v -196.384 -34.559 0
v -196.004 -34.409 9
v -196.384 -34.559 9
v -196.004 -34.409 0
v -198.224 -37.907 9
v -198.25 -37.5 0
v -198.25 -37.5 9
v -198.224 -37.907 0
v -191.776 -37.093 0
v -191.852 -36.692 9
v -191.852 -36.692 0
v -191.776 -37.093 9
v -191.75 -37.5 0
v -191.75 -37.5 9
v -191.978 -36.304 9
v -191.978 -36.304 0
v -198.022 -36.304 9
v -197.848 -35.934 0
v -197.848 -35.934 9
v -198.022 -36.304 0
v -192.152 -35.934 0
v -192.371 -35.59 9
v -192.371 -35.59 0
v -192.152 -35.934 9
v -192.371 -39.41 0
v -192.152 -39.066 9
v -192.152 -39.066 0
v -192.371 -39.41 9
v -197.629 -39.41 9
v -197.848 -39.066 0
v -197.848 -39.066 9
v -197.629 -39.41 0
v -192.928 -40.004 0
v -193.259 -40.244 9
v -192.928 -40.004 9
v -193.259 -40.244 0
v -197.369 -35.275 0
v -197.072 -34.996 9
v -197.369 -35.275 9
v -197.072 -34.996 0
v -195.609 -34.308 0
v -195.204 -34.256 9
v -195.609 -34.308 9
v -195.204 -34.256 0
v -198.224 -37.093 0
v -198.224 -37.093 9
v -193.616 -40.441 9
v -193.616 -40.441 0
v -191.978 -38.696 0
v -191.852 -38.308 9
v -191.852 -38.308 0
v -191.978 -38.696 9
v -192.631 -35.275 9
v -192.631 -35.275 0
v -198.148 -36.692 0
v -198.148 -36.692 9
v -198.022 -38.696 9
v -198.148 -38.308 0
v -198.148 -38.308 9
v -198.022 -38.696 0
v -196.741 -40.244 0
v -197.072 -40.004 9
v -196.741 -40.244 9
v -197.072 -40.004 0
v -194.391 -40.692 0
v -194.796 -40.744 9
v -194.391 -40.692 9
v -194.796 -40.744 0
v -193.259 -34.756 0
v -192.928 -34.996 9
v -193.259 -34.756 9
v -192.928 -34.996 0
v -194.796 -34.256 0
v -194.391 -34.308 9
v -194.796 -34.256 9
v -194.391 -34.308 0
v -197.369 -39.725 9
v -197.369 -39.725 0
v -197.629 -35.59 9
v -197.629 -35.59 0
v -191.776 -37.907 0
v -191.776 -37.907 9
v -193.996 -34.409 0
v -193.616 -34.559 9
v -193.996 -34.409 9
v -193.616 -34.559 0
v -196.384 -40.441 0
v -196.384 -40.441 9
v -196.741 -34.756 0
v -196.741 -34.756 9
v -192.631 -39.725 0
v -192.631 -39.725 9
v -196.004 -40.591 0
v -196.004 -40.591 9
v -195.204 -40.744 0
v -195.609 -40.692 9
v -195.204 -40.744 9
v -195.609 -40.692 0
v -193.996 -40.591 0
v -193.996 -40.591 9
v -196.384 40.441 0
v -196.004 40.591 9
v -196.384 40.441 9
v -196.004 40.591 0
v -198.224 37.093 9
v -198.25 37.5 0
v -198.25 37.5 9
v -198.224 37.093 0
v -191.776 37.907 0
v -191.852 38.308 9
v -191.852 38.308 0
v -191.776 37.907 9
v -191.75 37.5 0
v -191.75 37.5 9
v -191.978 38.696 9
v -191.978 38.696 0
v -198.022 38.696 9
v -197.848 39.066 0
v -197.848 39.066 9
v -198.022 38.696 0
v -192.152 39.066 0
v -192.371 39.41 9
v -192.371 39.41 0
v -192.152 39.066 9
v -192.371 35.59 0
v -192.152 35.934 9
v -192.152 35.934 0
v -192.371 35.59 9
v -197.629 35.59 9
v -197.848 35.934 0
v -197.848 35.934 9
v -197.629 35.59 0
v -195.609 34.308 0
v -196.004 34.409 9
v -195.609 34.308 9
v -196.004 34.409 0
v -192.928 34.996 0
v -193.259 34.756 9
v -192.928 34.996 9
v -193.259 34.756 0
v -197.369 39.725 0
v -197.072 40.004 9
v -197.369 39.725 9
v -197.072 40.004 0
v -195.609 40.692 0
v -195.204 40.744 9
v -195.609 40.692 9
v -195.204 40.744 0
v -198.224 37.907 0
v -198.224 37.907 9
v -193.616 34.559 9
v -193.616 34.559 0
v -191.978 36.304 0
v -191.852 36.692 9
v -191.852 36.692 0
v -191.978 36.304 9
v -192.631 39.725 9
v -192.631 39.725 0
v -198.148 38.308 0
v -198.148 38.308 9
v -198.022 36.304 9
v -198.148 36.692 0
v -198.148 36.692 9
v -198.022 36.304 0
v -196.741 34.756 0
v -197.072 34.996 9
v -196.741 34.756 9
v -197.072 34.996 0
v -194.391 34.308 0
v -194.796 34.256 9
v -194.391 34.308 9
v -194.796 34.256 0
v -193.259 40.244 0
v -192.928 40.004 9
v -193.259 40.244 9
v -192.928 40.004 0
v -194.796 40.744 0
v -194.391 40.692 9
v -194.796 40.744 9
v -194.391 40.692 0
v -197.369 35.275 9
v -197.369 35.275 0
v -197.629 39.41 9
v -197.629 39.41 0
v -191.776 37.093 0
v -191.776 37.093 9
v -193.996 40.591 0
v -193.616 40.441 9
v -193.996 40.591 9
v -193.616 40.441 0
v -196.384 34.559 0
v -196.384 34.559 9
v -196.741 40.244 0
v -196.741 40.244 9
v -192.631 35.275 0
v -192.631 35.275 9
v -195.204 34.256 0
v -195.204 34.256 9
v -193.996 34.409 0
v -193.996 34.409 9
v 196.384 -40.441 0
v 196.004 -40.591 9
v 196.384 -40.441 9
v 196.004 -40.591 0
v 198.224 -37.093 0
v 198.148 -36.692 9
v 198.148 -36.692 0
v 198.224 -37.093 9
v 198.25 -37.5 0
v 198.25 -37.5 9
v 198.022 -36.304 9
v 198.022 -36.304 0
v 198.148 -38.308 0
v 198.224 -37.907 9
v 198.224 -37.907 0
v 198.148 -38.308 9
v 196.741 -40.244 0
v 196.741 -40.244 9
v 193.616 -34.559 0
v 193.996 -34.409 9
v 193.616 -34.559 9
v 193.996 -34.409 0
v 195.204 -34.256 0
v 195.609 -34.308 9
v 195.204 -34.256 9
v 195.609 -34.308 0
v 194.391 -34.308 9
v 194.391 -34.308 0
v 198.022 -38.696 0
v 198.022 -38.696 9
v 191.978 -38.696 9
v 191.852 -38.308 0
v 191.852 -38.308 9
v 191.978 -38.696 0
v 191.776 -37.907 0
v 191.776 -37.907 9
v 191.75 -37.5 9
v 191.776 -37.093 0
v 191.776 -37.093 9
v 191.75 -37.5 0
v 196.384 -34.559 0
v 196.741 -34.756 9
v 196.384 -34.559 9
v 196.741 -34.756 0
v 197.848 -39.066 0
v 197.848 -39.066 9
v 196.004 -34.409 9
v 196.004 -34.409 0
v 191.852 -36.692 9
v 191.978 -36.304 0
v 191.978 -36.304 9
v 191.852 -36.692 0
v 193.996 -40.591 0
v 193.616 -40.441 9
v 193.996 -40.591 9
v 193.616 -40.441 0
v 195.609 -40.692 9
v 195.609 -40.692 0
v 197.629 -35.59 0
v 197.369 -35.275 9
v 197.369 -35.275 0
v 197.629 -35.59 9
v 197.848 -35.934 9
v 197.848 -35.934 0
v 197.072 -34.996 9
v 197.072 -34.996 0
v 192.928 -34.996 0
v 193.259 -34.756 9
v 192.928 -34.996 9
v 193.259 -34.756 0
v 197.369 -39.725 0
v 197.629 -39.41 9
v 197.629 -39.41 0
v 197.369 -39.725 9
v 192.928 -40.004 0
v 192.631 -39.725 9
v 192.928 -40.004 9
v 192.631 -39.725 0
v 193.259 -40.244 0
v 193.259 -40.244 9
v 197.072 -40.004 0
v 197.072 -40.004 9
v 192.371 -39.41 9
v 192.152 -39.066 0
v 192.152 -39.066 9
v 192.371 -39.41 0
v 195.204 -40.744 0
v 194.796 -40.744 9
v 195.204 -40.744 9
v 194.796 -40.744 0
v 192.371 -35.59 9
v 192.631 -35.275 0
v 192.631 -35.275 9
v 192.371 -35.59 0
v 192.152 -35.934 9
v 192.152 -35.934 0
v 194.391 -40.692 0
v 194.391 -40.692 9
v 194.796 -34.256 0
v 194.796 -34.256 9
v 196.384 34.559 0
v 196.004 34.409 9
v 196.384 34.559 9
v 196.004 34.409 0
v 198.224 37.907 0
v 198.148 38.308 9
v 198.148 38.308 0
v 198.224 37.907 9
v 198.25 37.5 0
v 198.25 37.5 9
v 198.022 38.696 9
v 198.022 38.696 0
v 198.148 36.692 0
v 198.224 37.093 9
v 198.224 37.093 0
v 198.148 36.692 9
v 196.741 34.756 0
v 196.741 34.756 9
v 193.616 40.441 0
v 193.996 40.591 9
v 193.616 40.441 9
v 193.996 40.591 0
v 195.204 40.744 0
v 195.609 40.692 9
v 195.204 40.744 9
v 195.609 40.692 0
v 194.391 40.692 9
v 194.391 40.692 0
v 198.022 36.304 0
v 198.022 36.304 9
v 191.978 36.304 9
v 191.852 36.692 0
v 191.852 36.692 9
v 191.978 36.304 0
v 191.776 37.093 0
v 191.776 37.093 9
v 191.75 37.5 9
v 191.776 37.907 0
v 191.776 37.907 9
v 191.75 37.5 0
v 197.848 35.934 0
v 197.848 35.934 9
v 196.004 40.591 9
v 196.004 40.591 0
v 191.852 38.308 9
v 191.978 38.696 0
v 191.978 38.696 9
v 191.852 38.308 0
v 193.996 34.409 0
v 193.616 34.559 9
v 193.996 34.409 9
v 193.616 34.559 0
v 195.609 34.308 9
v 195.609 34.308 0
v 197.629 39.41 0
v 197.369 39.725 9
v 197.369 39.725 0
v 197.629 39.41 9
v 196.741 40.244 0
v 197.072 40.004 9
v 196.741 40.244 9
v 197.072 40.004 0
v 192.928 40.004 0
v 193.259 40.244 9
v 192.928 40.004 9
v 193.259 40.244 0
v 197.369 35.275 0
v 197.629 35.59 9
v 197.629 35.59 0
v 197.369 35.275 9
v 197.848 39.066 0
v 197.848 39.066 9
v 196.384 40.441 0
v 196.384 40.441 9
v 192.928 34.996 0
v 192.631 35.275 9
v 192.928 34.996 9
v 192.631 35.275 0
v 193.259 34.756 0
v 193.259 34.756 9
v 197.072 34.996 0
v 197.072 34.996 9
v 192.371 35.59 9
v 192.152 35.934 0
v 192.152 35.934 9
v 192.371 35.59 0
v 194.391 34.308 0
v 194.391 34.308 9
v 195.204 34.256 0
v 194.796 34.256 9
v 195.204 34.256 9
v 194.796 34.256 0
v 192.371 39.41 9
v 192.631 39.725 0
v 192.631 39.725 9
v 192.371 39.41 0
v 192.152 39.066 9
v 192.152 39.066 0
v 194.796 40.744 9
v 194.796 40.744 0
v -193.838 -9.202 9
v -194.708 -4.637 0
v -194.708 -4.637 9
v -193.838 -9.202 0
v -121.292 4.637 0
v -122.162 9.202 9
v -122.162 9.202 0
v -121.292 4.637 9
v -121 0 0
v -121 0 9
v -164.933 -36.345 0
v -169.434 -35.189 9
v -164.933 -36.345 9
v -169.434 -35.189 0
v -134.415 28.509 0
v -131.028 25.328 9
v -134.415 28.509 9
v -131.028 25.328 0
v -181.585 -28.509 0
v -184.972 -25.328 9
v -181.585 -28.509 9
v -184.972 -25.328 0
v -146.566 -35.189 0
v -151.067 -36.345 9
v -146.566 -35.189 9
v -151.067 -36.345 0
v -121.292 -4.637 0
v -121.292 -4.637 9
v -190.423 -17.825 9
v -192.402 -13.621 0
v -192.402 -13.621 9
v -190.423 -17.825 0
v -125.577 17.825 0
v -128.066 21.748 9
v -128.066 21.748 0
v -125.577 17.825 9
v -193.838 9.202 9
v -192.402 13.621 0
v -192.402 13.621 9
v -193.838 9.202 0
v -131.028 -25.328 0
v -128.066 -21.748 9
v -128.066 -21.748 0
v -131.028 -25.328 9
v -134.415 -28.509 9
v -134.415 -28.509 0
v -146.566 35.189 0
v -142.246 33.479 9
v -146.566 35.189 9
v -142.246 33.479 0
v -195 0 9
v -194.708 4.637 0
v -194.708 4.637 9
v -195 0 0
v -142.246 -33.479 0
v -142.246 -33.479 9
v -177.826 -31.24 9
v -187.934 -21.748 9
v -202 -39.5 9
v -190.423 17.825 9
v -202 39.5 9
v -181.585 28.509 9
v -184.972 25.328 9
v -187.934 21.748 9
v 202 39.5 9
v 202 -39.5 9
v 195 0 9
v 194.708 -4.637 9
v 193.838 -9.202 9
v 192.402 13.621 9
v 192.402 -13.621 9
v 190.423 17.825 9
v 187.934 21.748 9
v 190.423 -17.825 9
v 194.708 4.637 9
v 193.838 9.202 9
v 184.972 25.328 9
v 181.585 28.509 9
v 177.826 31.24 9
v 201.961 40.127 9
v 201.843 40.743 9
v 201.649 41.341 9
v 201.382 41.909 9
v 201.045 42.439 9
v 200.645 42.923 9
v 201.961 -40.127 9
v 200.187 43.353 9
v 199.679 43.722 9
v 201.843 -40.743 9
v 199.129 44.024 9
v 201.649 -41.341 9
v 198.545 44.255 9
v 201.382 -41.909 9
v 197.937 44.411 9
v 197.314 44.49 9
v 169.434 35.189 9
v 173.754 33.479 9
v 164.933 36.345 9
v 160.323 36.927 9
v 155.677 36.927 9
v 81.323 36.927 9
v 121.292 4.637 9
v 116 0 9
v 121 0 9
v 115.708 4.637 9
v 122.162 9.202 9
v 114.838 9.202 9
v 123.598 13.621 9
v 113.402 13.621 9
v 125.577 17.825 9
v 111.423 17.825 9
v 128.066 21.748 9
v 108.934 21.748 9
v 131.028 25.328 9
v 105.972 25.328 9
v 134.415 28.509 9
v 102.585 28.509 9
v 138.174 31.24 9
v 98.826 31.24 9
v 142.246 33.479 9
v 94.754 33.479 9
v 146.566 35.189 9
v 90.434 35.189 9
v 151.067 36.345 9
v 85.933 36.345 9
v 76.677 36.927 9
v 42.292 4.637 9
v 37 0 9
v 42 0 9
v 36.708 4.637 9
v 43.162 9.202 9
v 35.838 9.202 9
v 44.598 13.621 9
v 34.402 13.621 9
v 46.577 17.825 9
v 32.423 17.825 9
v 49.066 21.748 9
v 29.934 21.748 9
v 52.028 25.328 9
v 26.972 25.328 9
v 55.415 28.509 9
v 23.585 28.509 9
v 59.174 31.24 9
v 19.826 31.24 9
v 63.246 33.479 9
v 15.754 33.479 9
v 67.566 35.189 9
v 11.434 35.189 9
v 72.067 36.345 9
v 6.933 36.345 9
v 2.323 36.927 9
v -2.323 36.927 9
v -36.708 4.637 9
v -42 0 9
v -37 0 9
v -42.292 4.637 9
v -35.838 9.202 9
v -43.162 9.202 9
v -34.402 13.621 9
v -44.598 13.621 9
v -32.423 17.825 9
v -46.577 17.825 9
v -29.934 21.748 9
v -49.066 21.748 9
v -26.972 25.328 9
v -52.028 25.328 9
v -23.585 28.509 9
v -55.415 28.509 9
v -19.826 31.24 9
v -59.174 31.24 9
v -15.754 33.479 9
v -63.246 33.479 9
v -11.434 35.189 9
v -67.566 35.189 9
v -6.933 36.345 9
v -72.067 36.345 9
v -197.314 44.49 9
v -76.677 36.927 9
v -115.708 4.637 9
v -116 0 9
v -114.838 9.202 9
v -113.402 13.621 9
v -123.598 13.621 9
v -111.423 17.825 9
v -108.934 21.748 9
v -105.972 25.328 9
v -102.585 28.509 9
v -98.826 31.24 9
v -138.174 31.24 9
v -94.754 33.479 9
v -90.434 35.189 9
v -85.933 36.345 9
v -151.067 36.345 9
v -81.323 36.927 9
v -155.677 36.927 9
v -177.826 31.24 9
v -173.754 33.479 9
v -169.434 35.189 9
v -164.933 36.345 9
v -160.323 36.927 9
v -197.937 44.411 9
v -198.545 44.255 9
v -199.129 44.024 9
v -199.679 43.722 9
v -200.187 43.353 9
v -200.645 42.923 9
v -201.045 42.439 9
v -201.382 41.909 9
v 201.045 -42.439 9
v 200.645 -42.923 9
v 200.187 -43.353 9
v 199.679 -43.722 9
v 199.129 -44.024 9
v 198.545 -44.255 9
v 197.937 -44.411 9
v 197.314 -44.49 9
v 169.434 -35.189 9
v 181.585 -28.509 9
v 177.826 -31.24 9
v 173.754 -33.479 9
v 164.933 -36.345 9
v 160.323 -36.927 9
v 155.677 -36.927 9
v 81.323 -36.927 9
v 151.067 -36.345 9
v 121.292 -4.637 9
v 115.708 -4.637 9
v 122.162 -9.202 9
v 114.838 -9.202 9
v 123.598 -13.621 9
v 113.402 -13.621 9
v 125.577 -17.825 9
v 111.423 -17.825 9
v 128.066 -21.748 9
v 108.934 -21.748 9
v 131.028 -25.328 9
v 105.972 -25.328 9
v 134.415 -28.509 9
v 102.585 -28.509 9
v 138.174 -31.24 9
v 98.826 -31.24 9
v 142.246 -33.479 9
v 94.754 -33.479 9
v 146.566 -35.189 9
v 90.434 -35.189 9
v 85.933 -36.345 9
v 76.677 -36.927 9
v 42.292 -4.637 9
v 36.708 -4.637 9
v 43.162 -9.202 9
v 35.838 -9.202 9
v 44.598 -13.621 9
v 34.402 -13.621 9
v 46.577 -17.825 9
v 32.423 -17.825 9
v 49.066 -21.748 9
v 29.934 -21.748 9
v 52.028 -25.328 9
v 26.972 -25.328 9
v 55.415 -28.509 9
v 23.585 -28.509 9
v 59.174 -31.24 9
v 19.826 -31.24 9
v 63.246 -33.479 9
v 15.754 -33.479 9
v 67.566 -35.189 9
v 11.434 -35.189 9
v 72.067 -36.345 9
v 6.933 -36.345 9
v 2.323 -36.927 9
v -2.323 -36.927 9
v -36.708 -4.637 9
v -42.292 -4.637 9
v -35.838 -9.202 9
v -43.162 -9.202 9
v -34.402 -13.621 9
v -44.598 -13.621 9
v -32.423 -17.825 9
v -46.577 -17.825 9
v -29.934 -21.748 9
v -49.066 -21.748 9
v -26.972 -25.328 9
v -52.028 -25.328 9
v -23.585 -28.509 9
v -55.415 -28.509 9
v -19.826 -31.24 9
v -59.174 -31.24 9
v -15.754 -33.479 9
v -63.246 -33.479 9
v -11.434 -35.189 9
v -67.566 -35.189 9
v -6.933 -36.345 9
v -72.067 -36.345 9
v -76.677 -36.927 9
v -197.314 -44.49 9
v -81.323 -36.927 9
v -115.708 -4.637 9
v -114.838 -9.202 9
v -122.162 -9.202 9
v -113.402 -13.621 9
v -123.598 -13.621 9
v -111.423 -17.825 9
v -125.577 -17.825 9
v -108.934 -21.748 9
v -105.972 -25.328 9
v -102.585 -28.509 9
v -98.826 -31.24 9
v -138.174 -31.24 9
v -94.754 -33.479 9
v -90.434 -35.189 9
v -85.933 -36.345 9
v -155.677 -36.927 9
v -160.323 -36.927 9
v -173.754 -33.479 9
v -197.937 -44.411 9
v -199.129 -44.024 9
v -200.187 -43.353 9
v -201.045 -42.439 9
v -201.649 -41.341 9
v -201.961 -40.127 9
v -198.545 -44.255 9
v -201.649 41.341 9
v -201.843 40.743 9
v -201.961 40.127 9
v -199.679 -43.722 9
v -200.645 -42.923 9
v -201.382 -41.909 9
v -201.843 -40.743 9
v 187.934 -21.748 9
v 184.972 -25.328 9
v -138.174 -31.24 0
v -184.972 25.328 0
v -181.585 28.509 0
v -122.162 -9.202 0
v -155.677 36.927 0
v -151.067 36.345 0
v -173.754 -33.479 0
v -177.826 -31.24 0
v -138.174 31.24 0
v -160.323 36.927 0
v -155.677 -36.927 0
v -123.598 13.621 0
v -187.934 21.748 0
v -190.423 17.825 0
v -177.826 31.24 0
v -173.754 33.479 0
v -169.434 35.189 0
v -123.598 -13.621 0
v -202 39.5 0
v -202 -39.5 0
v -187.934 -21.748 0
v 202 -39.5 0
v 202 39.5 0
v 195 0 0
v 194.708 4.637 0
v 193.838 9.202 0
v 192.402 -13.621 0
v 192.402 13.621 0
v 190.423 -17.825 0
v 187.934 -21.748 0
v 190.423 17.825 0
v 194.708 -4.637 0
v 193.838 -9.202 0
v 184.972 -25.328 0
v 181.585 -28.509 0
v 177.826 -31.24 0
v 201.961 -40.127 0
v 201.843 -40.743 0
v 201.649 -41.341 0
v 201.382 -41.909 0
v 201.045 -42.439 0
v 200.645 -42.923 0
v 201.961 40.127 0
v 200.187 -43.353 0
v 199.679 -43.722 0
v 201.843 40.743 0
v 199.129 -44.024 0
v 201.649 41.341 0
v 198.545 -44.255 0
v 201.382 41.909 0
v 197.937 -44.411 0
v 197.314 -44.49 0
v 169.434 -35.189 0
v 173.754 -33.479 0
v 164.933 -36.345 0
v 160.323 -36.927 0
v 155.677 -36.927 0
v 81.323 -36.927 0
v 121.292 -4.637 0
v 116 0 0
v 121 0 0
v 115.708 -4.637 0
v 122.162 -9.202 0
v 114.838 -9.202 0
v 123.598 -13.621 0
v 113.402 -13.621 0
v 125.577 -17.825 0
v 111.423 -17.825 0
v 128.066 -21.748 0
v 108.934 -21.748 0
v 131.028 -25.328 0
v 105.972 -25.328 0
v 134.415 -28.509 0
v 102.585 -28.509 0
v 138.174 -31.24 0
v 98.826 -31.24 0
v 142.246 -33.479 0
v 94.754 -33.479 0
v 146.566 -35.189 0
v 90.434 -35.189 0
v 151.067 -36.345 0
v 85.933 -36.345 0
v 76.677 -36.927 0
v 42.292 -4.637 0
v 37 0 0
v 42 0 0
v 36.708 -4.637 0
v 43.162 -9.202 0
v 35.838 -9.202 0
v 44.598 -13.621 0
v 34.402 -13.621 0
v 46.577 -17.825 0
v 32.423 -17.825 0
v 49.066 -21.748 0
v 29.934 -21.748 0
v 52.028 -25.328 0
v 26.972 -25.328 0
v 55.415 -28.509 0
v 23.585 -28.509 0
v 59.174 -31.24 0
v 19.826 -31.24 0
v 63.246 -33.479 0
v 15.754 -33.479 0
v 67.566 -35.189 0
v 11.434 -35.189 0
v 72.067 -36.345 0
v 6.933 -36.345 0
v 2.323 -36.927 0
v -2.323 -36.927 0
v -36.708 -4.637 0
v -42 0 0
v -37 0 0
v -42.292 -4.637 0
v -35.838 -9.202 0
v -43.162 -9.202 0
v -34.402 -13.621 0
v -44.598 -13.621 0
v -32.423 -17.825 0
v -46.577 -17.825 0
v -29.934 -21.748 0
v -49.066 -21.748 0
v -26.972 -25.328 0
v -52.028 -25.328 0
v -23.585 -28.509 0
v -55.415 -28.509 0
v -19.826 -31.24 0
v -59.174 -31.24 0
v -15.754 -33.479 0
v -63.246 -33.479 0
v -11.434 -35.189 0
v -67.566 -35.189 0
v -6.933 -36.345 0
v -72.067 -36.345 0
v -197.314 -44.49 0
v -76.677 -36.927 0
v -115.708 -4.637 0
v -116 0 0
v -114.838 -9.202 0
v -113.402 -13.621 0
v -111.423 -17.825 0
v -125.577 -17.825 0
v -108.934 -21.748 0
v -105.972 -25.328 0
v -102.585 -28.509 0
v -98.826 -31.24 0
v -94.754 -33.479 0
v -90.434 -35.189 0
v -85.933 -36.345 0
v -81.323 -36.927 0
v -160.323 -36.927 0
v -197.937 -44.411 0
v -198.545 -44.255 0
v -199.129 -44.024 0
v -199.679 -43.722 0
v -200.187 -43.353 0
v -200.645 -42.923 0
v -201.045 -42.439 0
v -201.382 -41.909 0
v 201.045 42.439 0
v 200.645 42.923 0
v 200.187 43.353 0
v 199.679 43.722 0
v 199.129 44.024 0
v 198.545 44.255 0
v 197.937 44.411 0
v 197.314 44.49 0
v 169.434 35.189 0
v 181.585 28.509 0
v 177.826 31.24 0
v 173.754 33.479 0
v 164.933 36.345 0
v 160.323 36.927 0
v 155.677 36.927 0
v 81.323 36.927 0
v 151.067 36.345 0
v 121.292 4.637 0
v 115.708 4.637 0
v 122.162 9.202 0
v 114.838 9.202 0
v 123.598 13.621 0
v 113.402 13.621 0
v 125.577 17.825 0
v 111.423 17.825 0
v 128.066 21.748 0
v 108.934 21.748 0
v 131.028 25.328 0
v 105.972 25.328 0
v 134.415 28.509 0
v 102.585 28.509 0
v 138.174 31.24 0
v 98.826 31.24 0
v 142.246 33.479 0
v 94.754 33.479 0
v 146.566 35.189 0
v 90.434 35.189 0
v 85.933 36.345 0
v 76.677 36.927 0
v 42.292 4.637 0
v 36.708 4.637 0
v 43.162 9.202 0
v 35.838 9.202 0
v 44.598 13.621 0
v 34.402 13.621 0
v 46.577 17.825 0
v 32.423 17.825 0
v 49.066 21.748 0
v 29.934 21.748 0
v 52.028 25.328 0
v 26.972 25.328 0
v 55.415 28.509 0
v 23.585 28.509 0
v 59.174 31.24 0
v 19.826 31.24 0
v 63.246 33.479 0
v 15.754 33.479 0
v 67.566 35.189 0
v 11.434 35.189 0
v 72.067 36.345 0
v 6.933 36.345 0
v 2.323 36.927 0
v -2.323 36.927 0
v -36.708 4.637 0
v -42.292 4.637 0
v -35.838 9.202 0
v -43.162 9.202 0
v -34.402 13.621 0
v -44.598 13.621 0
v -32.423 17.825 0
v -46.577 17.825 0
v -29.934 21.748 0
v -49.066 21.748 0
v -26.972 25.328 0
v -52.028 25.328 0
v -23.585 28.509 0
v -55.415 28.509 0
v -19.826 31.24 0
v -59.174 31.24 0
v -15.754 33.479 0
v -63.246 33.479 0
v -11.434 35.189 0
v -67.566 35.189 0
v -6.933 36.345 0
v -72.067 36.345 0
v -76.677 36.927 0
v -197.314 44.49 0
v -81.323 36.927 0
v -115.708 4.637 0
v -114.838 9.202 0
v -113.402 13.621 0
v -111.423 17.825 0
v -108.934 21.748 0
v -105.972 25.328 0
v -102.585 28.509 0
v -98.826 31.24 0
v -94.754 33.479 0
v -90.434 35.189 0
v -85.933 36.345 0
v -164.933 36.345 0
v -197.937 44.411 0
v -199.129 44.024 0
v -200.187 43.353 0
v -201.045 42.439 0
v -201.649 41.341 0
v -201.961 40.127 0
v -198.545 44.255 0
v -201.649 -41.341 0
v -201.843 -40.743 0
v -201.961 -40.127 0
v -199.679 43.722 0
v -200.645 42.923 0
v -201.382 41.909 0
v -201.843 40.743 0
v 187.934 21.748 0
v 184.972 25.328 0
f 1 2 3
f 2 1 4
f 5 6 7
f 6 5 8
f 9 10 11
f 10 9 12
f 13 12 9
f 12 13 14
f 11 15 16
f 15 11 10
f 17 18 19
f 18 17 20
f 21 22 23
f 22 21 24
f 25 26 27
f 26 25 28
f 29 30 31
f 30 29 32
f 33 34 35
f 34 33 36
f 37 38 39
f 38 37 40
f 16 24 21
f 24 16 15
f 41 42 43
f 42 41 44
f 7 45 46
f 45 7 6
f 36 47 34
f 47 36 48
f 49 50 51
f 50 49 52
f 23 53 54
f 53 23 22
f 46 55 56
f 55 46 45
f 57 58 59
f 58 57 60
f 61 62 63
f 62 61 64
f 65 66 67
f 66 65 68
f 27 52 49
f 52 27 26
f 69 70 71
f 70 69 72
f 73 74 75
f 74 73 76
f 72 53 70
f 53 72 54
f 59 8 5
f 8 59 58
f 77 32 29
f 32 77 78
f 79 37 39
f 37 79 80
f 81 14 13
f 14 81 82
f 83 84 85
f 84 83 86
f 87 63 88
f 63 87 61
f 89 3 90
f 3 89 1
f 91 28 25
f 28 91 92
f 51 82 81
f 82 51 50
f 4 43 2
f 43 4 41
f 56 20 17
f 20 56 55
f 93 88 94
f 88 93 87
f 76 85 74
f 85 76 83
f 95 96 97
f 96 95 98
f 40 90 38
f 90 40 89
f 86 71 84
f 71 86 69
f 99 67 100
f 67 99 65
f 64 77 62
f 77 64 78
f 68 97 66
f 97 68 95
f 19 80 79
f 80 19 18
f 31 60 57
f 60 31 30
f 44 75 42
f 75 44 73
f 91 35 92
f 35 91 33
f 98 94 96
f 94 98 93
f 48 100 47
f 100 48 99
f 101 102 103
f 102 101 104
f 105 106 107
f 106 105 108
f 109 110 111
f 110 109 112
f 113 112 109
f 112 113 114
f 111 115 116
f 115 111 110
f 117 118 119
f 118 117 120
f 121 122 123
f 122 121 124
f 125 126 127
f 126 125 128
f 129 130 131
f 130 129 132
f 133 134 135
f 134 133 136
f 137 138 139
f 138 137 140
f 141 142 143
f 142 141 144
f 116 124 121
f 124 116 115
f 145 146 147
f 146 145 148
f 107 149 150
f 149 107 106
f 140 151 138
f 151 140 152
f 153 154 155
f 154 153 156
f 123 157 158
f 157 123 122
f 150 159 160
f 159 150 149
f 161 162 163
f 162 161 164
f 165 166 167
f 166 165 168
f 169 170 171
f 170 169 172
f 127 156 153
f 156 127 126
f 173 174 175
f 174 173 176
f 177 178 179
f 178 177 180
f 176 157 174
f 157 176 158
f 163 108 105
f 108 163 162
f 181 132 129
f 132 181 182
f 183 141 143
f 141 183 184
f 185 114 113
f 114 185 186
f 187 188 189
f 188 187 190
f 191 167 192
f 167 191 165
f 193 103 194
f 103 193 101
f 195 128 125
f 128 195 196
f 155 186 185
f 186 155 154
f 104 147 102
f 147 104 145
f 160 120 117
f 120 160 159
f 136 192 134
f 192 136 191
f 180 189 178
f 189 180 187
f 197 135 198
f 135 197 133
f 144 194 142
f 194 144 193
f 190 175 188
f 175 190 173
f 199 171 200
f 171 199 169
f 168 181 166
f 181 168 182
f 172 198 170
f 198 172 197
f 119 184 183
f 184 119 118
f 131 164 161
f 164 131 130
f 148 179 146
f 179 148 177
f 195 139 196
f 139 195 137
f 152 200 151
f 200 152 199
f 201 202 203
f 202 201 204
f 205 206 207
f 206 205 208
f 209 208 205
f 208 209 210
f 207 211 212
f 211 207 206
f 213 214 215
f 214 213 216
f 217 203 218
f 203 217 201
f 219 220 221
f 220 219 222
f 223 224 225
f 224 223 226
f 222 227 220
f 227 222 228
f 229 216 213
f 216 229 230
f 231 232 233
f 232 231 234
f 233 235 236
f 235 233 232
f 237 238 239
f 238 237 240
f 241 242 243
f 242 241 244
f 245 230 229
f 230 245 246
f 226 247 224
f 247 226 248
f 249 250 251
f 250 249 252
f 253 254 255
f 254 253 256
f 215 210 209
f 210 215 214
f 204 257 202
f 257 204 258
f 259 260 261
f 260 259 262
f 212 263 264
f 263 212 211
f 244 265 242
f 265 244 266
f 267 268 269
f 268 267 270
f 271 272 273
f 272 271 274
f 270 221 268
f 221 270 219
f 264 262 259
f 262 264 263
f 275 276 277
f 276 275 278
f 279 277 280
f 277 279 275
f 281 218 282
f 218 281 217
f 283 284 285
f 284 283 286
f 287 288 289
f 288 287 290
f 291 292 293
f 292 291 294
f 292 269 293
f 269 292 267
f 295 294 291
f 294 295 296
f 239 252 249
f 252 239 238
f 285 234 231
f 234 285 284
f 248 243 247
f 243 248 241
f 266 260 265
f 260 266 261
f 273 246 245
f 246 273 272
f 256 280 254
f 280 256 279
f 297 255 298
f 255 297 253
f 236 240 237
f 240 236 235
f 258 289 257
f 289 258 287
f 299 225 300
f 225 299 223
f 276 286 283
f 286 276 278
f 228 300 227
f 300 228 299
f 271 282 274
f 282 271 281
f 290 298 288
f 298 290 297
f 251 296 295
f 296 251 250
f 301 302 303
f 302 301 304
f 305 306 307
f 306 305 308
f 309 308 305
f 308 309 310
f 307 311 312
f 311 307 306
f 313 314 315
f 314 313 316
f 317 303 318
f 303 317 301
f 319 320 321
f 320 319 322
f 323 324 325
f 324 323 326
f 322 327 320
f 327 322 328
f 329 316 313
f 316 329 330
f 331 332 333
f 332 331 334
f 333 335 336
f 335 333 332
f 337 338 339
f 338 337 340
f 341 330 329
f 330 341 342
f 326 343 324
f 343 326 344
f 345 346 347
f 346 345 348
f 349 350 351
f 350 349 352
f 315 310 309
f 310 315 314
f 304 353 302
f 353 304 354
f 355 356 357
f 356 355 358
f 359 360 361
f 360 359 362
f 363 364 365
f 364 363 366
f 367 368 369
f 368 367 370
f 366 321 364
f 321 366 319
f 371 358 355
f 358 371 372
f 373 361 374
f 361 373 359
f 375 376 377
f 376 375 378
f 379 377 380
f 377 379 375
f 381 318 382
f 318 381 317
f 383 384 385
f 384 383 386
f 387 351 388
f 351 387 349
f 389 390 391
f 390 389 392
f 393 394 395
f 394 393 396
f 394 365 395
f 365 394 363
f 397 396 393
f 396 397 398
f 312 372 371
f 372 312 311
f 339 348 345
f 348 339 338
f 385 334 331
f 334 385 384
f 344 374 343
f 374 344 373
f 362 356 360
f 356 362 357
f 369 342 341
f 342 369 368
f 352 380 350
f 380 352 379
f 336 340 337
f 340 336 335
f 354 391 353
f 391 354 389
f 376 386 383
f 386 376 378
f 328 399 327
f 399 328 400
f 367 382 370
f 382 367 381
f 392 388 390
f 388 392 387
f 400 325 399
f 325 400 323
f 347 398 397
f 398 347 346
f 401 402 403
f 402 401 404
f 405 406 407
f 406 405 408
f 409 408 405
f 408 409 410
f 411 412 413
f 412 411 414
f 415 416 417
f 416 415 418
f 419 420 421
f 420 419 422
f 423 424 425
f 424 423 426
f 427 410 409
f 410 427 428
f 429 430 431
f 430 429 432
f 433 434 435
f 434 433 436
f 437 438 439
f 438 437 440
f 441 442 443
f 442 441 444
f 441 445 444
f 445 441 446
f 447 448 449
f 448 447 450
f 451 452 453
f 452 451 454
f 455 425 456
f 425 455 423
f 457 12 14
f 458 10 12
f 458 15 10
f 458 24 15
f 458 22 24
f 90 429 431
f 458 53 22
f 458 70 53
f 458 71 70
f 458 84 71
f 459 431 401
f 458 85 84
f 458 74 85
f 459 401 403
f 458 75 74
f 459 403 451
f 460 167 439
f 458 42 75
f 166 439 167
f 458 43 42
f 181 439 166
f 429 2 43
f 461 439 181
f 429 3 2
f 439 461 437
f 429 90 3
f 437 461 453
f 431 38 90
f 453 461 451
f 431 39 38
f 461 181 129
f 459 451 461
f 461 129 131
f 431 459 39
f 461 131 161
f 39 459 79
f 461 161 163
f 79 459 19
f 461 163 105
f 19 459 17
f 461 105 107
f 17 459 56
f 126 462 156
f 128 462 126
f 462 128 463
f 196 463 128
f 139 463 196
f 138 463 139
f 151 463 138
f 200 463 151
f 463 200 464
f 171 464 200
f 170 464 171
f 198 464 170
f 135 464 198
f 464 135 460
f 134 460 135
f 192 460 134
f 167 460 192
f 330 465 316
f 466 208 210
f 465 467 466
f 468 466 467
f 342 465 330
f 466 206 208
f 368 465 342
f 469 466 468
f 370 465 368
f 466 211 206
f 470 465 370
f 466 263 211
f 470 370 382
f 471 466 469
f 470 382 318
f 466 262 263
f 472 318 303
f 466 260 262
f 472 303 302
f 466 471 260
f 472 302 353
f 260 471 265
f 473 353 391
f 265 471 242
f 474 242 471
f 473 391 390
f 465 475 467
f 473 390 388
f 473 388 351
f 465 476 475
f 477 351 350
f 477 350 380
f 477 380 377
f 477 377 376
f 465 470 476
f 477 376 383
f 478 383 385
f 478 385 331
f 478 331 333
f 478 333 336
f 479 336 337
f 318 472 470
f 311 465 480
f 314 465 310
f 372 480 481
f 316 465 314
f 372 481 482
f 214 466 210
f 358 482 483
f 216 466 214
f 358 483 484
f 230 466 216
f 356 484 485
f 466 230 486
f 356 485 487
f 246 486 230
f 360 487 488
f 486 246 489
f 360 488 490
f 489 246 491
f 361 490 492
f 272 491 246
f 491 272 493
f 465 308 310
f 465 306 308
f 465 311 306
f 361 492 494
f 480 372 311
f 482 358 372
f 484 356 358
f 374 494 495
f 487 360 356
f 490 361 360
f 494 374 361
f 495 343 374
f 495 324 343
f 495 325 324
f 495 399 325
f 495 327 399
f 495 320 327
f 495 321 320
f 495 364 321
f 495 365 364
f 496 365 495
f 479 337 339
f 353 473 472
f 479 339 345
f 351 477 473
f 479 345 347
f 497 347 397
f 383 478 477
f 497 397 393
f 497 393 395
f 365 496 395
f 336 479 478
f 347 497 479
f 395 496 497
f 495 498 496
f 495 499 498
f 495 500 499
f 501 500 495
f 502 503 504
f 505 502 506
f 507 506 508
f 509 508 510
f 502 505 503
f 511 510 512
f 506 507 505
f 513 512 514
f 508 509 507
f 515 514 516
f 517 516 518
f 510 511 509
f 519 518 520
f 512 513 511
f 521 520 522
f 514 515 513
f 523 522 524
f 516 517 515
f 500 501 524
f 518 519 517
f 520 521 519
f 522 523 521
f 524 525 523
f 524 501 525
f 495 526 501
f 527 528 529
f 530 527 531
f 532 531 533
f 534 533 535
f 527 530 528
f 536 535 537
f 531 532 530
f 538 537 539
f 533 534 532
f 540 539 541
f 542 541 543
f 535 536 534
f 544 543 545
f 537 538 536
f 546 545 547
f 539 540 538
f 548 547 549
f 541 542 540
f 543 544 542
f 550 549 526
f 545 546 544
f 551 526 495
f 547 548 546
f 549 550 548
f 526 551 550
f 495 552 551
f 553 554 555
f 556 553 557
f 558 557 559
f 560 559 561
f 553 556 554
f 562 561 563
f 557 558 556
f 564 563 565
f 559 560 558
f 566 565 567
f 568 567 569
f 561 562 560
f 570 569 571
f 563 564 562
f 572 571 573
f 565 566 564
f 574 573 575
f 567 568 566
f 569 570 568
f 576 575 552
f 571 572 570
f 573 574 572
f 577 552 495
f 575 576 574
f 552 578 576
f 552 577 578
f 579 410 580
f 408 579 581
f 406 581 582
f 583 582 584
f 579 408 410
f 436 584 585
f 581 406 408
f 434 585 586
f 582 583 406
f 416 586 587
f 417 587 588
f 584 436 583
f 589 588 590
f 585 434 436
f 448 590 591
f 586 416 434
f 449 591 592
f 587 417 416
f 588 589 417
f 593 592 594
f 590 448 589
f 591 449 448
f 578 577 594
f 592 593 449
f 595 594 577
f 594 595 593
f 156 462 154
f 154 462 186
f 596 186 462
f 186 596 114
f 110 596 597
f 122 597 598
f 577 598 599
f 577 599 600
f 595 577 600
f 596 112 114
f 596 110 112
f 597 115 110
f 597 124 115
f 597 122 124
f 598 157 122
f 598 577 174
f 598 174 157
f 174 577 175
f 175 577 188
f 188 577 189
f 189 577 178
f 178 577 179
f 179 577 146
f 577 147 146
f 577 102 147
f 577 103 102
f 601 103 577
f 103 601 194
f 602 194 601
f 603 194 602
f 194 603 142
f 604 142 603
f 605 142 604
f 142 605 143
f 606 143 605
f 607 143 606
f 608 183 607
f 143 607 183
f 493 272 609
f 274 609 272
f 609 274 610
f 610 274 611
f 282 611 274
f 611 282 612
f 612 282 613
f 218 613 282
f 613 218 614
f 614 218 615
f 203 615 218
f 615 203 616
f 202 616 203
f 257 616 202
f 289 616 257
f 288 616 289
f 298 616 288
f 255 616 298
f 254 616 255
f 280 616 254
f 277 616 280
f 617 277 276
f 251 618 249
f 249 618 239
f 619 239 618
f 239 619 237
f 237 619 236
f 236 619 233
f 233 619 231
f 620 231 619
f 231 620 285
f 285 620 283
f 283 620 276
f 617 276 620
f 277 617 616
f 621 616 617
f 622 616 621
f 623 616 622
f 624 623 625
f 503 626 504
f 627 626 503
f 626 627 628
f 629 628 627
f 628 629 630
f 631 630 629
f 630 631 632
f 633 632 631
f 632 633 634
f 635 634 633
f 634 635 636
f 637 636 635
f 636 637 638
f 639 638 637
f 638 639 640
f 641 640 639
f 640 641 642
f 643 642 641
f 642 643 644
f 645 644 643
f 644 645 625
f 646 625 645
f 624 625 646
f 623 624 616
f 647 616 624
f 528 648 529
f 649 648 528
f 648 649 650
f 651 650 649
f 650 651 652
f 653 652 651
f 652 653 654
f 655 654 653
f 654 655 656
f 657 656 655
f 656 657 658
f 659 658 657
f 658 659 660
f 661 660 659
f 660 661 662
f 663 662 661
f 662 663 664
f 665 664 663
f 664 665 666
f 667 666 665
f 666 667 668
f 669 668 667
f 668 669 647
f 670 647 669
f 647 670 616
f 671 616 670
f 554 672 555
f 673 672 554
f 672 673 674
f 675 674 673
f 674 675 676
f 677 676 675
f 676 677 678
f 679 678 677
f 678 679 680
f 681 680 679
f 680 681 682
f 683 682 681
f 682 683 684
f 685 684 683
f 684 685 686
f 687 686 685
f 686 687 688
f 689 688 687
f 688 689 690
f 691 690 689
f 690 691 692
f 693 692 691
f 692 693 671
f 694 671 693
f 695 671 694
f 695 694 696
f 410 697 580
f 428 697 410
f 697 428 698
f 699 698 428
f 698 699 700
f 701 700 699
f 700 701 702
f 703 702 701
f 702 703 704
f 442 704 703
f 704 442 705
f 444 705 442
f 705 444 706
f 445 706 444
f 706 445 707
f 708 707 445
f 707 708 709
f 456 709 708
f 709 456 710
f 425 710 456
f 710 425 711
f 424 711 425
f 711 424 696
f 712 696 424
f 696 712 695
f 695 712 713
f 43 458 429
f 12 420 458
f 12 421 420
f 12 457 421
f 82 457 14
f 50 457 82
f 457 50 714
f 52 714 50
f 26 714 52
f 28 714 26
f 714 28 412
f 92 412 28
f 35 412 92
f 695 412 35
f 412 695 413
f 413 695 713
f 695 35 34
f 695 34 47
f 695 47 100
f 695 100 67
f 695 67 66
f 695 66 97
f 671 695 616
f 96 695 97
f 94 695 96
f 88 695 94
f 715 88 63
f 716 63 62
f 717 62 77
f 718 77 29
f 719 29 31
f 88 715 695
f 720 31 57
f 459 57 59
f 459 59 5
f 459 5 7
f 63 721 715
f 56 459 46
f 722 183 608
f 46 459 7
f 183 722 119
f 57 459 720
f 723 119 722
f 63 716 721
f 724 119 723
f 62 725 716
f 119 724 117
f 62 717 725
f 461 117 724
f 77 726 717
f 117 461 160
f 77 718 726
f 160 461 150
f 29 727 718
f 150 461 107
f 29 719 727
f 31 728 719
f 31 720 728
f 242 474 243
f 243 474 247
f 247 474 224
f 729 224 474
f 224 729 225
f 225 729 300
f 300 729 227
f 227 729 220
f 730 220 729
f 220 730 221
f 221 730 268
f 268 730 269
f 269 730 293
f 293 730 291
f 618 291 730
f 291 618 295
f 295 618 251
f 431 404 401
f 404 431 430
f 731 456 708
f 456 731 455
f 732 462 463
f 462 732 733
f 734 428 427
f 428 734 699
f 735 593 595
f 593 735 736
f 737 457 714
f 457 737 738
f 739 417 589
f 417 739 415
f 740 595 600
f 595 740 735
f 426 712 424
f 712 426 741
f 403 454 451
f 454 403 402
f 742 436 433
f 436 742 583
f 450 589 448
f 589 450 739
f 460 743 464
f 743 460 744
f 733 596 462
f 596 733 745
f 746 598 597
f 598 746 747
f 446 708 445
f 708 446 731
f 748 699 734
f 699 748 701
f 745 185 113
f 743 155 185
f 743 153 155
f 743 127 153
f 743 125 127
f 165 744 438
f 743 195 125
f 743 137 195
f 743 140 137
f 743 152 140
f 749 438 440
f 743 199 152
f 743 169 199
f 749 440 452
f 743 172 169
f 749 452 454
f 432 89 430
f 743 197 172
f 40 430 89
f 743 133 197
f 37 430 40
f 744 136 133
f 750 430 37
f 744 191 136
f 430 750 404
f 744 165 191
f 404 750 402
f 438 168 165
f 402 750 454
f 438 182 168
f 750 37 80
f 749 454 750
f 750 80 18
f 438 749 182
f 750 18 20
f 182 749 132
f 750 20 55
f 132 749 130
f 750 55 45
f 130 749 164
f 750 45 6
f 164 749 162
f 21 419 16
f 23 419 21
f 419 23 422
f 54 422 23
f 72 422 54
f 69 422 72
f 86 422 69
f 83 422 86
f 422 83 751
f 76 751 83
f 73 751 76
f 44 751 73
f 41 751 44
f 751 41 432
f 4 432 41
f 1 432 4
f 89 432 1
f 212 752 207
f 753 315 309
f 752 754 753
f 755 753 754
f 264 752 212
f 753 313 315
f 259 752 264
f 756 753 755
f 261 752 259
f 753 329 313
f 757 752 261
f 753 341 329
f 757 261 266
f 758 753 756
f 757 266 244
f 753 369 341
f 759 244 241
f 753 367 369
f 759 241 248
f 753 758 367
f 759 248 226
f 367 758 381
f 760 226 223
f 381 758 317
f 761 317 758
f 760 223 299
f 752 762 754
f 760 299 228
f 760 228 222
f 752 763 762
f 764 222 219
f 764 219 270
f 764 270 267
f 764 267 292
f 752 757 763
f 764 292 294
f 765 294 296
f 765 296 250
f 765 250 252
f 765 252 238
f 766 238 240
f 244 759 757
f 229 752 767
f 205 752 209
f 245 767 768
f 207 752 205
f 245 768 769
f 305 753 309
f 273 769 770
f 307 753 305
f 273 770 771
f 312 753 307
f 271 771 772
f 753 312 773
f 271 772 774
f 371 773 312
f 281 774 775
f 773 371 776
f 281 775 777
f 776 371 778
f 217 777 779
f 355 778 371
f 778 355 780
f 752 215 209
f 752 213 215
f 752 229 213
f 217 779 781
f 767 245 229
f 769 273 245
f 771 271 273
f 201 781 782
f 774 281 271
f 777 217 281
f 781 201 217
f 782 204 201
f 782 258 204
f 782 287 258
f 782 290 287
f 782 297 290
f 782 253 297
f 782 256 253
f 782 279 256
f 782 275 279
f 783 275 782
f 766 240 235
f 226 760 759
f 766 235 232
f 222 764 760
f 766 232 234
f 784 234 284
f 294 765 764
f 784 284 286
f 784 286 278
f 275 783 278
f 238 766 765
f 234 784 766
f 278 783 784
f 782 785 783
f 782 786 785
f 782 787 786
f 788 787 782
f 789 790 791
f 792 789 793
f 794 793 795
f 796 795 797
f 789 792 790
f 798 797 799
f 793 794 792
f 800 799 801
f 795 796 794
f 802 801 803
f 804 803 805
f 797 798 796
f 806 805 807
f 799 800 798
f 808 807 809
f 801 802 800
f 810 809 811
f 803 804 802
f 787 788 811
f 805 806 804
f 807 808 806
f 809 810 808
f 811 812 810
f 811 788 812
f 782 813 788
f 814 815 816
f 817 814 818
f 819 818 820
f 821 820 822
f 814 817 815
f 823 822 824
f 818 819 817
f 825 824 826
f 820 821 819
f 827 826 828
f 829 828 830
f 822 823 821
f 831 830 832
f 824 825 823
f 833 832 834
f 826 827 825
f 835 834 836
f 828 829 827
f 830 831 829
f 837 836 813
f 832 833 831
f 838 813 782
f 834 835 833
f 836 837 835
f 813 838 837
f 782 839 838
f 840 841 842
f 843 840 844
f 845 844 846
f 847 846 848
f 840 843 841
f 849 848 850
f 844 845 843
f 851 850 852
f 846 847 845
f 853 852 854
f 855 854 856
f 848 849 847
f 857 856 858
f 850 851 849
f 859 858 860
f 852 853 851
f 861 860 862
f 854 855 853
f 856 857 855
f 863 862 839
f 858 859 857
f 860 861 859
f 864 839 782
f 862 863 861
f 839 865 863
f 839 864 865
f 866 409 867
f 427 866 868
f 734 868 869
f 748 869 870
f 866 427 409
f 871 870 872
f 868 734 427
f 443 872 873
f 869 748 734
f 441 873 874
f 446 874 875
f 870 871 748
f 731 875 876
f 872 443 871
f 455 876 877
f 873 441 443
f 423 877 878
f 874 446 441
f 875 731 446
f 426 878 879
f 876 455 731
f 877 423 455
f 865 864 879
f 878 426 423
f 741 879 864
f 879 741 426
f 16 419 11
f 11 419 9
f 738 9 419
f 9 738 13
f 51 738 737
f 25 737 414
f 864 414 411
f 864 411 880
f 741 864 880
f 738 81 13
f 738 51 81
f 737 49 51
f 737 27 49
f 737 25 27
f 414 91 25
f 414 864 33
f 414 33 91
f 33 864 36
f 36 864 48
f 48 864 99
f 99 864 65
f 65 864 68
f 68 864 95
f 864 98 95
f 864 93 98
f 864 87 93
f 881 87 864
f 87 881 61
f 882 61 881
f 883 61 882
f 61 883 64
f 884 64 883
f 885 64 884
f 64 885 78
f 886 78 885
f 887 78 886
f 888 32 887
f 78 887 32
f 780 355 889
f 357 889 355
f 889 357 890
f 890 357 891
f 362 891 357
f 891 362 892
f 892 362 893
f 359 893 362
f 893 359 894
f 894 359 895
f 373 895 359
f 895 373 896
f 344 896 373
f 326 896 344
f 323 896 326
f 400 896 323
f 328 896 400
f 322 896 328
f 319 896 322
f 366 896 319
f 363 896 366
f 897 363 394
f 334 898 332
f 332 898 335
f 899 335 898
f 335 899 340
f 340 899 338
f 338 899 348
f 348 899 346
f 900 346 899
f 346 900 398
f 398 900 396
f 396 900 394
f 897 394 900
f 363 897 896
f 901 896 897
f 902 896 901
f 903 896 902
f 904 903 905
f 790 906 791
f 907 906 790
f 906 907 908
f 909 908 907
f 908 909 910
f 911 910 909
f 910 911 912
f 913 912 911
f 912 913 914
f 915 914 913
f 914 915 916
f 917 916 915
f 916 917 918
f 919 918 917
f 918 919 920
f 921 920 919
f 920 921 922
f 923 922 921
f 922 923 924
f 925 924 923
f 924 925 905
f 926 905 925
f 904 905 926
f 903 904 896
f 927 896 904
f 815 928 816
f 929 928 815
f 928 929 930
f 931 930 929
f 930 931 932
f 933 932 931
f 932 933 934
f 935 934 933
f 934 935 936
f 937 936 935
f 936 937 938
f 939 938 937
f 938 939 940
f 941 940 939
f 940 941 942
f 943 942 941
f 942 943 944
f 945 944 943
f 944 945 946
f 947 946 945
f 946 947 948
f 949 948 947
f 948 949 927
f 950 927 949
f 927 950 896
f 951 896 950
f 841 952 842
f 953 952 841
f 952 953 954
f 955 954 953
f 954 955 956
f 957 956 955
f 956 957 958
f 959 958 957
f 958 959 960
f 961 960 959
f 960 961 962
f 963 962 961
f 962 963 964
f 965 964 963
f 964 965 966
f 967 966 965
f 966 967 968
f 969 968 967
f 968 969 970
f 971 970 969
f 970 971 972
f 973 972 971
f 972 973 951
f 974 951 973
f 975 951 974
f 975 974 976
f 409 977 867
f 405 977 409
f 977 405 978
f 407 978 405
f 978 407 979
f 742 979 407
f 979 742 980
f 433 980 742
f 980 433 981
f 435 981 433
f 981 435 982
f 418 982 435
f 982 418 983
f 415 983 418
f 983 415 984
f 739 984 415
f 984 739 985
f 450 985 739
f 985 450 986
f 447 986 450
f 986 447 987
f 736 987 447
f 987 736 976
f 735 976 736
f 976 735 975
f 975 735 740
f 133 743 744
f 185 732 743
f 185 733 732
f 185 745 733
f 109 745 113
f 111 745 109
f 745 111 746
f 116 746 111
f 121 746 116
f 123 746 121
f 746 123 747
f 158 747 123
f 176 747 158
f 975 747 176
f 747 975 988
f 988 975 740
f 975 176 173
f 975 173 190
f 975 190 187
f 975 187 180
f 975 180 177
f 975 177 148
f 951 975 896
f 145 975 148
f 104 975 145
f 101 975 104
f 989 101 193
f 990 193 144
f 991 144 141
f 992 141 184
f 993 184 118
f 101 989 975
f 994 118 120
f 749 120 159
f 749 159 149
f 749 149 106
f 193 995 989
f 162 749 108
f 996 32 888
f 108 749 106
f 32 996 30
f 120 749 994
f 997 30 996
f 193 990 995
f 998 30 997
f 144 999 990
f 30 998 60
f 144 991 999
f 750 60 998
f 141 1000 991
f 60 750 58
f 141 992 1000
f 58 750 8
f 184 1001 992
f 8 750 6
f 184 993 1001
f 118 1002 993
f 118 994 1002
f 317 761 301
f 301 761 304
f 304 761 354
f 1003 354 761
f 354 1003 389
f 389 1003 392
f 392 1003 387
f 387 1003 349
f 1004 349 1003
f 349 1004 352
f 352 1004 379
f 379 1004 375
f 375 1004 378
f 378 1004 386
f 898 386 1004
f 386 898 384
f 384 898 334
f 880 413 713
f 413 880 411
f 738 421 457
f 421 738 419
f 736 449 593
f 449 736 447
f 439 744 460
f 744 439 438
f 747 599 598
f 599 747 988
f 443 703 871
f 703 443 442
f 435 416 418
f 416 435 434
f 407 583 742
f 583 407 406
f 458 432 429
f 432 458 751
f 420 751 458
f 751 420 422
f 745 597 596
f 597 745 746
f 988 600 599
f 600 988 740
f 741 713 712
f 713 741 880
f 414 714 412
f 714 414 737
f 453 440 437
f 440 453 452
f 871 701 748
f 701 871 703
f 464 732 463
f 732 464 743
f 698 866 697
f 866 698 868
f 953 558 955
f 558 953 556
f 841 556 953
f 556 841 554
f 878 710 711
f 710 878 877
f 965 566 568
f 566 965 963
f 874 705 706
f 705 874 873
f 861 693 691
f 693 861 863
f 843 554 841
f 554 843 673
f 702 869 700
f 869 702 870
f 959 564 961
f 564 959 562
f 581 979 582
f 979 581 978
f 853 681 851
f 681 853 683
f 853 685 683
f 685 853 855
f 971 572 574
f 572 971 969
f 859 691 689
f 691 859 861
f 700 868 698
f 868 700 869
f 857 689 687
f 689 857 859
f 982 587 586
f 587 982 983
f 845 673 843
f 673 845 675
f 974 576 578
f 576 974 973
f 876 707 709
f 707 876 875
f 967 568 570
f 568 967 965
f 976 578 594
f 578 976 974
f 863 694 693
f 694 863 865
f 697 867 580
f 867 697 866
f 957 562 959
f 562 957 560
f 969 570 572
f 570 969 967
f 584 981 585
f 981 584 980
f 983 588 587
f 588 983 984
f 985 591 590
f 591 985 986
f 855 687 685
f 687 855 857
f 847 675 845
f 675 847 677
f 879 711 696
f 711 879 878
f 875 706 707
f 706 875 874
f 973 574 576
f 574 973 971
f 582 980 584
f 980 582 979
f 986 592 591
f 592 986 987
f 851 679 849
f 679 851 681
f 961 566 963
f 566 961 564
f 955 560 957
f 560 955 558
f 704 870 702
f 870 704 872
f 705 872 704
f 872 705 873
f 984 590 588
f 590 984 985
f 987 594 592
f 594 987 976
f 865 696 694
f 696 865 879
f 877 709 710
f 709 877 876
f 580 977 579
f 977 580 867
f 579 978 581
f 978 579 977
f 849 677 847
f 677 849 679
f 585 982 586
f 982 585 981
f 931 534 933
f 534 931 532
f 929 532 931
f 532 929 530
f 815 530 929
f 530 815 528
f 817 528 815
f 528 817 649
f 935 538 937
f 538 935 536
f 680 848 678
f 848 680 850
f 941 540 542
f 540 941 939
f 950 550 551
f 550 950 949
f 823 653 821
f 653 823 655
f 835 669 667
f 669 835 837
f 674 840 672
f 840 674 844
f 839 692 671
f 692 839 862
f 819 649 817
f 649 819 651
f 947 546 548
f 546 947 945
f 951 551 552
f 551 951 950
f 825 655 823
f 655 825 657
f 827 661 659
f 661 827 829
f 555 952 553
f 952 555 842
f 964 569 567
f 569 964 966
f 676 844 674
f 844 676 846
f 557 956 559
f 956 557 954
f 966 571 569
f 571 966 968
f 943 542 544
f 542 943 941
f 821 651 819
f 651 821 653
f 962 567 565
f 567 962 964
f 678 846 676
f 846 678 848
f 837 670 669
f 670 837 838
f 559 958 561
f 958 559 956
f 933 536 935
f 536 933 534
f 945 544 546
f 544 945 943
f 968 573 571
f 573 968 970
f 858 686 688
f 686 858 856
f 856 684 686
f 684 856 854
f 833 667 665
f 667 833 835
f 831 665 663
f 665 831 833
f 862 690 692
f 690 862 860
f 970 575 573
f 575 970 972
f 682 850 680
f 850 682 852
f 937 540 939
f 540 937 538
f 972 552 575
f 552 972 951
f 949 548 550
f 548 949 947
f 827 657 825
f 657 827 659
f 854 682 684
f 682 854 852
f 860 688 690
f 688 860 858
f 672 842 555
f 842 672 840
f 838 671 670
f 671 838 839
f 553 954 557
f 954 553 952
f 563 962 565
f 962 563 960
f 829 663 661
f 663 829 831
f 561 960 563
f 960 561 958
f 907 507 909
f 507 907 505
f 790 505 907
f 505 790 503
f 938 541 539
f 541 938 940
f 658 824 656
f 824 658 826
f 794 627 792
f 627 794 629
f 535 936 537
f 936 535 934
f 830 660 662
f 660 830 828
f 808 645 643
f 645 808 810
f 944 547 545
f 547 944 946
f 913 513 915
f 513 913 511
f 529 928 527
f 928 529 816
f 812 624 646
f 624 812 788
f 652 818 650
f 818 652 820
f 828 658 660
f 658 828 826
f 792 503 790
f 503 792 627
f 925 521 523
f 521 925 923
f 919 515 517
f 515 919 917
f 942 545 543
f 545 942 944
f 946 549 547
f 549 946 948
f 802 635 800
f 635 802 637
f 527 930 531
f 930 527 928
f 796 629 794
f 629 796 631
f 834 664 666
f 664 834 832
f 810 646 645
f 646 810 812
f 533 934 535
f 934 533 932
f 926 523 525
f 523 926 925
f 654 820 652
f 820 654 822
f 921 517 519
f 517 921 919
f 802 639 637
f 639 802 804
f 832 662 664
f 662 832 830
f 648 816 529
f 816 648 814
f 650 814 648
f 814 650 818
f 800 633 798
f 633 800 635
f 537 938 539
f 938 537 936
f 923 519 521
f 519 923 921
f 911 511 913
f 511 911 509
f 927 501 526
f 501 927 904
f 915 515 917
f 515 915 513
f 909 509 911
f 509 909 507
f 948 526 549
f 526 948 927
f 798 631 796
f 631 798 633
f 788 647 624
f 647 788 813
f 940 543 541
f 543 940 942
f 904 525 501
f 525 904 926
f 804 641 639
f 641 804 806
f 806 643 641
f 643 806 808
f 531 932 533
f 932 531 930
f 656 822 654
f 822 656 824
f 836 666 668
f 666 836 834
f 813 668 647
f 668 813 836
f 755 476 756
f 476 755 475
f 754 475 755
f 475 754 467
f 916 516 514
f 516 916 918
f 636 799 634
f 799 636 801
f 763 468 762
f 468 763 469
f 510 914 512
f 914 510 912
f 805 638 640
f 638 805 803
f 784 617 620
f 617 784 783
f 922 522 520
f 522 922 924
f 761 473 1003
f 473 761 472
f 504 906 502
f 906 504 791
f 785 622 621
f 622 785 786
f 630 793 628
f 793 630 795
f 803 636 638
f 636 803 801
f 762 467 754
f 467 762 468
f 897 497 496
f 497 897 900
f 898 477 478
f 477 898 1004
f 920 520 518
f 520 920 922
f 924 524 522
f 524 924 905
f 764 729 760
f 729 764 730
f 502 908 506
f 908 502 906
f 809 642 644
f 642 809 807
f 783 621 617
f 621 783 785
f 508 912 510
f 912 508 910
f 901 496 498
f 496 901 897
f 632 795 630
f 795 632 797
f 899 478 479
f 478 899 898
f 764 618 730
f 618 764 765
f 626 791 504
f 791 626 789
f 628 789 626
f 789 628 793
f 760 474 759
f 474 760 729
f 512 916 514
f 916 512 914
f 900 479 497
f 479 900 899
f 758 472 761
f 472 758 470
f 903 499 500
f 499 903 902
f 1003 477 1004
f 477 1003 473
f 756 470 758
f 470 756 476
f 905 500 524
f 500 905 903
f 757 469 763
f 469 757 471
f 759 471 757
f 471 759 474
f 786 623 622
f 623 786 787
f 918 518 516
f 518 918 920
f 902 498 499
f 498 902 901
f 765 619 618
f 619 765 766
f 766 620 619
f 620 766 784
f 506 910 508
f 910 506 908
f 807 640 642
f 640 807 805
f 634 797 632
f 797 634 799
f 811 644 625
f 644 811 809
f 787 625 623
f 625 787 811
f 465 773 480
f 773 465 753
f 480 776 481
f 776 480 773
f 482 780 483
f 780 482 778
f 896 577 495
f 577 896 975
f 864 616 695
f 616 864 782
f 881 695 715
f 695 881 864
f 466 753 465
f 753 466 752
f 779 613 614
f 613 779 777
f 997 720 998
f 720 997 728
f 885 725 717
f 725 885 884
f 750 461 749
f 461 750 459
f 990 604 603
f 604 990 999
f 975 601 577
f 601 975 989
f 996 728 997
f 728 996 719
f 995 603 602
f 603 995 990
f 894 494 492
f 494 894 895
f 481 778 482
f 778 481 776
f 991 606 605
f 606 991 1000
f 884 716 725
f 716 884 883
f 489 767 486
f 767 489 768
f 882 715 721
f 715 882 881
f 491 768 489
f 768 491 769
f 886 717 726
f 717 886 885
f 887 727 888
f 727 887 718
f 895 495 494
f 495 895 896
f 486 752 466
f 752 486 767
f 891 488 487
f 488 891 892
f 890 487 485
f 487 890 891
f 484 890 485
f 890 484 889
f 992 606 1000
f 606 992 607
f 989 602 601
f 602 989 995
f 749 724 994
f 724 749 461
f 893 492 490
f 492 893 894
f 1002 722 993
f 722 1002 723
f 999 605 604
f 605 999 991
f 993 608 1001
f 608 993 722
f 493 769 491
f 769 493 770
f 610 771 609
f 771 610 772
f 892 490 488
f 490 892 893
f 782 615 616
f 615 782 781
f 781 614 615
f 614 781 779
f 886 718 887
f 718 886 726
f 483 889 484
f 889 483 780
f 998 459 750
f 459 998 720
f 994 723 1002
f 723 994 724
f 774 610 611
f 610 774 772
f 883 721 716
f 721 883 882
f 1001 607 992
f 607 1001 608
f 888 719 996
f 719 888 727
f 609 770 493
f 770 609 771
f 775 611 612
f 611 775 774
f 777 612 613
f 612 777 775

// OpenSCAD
$fn = 50;


difference() {
	union() {
		hull() {
			translate(v = [-197.0000000000, 39.5000000000, 0]) {
				cylinder(h = 9, r = 5);
			}
			translate(v = [197.0000000000, 39.5000000000, 0]) {
				cylinder(h = 9, r = 5);
			}
			translate(v = [-197.0000000000, -39.5000000000, 0]) {
				cylinder(h = 9, r = 5);
			}
			translate(v = [197.0000000000, -39.5000000000, 0]) {
				cylinder(h = 9, r = 5);
			}
		}
	}
	union() {
		#translate(v = [-195.0000000000, -37.5000000000, -100.0000000000]) {
			cylinder(h = 200, r = 3.2500000000);
		}
		#translate(v = [-195.0000000000, 37.5000000000, -100.0000000000]) {
			cylinder(h = 200, r = 3.2500000000);
		}
		#translate(v = [195.0000000000, -37.5000000000, -100.0000000000]) {
			cylinder(h = 200, r = 3.2500000000);
		}
		#translate(v = [195.0000000000, 37.5000000000, -100.0000000000]) {
			cylinder(h = 200, r = 3.2500000000);
		}
		#translate(v = [-158.0000000000, 0, 0]) {
			cylinder(h = 9, r = 37.0000000000);
		}
		#translate(v = [-79.0000000000, 0, 0]) {
			cylinder(h = 9, r = 37.0000000000);
		}
		#cylinder(h = 9, r = 37.0000000000);
		#translate(v = [79.0000000000, 0, 0]) {
			cylinder(h = 9, r = 37.0000000000);
		}
		#translate(v = [158.0000000000, 0, 0]) {
			cylinder(h = 9, r = 37.0000000000);
		}
	}
}
